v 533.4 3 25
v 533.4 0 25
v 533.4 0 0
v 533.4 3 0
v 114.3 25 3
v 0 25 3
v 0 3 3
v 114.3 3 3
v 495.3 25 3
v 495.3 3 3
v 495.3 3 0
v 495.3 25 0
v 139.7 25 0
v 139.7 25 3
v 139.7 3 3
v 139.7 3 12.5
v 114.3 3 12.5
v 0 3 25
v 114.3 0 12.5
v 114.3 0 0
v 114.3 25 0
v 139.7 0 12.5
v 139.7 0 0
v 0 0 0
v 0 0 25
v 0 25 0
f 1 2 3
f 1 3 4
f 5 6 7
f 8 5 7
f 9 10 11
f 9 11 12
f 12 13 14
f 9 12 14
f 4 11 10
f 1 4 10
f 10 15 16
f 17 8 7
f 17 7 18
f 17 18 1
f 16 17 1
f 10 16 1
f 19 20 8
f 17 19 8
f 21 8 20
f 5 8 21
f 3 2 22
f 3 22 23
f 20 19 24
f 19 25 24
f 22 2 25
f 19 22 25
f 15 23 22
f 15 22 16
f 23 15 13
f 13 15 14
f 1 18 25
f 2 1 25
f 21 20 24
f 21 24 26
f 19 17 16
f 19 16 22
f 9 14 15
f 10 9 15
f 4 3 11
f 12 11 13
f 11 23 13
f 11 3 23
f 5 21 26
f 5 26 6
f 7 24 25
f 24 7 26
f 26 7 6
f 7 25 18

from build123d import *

# Parameters (mm, degrees)
F1_DEPTH = 533.4
F4_DEPTH = 25.4
F6_W     = 22
F6_H     = 3
F7_DEPTH = 38.1


with BuildPart() as f1:
    # F0 (on Right) → F1 (new body)
    with BuildSketch(Plane.YZ):
        Polygon((0, 25), (0, 0), (25, 0), (25, 3), (3, 3), (3, 25), align=None)
    extrude(amount=F1_DEPTH)

    # F3 (on offset) → F4 (cut)
    with BuildSketch(Plane.YZ.offset(114.3)):
        Polygon((0, 12.5), (0, 0), (25, 0), (25, 3), (3, 3), (3, 12.5), align=None)
    extrude(amount=F4_DEPTH, mode=Mode.SUBTRACT)

    # F6 (on offset) → F7 (cut)
    with BuildSketch(Plane.YZ.offset(533.4)):
        with Locations((14, 1.5)):
            Rectangle(F6_W, F6_H)
    extrude(amount=-F7_DEPTH, mode=Mode.SUBTRACT)


solid = f1.part
